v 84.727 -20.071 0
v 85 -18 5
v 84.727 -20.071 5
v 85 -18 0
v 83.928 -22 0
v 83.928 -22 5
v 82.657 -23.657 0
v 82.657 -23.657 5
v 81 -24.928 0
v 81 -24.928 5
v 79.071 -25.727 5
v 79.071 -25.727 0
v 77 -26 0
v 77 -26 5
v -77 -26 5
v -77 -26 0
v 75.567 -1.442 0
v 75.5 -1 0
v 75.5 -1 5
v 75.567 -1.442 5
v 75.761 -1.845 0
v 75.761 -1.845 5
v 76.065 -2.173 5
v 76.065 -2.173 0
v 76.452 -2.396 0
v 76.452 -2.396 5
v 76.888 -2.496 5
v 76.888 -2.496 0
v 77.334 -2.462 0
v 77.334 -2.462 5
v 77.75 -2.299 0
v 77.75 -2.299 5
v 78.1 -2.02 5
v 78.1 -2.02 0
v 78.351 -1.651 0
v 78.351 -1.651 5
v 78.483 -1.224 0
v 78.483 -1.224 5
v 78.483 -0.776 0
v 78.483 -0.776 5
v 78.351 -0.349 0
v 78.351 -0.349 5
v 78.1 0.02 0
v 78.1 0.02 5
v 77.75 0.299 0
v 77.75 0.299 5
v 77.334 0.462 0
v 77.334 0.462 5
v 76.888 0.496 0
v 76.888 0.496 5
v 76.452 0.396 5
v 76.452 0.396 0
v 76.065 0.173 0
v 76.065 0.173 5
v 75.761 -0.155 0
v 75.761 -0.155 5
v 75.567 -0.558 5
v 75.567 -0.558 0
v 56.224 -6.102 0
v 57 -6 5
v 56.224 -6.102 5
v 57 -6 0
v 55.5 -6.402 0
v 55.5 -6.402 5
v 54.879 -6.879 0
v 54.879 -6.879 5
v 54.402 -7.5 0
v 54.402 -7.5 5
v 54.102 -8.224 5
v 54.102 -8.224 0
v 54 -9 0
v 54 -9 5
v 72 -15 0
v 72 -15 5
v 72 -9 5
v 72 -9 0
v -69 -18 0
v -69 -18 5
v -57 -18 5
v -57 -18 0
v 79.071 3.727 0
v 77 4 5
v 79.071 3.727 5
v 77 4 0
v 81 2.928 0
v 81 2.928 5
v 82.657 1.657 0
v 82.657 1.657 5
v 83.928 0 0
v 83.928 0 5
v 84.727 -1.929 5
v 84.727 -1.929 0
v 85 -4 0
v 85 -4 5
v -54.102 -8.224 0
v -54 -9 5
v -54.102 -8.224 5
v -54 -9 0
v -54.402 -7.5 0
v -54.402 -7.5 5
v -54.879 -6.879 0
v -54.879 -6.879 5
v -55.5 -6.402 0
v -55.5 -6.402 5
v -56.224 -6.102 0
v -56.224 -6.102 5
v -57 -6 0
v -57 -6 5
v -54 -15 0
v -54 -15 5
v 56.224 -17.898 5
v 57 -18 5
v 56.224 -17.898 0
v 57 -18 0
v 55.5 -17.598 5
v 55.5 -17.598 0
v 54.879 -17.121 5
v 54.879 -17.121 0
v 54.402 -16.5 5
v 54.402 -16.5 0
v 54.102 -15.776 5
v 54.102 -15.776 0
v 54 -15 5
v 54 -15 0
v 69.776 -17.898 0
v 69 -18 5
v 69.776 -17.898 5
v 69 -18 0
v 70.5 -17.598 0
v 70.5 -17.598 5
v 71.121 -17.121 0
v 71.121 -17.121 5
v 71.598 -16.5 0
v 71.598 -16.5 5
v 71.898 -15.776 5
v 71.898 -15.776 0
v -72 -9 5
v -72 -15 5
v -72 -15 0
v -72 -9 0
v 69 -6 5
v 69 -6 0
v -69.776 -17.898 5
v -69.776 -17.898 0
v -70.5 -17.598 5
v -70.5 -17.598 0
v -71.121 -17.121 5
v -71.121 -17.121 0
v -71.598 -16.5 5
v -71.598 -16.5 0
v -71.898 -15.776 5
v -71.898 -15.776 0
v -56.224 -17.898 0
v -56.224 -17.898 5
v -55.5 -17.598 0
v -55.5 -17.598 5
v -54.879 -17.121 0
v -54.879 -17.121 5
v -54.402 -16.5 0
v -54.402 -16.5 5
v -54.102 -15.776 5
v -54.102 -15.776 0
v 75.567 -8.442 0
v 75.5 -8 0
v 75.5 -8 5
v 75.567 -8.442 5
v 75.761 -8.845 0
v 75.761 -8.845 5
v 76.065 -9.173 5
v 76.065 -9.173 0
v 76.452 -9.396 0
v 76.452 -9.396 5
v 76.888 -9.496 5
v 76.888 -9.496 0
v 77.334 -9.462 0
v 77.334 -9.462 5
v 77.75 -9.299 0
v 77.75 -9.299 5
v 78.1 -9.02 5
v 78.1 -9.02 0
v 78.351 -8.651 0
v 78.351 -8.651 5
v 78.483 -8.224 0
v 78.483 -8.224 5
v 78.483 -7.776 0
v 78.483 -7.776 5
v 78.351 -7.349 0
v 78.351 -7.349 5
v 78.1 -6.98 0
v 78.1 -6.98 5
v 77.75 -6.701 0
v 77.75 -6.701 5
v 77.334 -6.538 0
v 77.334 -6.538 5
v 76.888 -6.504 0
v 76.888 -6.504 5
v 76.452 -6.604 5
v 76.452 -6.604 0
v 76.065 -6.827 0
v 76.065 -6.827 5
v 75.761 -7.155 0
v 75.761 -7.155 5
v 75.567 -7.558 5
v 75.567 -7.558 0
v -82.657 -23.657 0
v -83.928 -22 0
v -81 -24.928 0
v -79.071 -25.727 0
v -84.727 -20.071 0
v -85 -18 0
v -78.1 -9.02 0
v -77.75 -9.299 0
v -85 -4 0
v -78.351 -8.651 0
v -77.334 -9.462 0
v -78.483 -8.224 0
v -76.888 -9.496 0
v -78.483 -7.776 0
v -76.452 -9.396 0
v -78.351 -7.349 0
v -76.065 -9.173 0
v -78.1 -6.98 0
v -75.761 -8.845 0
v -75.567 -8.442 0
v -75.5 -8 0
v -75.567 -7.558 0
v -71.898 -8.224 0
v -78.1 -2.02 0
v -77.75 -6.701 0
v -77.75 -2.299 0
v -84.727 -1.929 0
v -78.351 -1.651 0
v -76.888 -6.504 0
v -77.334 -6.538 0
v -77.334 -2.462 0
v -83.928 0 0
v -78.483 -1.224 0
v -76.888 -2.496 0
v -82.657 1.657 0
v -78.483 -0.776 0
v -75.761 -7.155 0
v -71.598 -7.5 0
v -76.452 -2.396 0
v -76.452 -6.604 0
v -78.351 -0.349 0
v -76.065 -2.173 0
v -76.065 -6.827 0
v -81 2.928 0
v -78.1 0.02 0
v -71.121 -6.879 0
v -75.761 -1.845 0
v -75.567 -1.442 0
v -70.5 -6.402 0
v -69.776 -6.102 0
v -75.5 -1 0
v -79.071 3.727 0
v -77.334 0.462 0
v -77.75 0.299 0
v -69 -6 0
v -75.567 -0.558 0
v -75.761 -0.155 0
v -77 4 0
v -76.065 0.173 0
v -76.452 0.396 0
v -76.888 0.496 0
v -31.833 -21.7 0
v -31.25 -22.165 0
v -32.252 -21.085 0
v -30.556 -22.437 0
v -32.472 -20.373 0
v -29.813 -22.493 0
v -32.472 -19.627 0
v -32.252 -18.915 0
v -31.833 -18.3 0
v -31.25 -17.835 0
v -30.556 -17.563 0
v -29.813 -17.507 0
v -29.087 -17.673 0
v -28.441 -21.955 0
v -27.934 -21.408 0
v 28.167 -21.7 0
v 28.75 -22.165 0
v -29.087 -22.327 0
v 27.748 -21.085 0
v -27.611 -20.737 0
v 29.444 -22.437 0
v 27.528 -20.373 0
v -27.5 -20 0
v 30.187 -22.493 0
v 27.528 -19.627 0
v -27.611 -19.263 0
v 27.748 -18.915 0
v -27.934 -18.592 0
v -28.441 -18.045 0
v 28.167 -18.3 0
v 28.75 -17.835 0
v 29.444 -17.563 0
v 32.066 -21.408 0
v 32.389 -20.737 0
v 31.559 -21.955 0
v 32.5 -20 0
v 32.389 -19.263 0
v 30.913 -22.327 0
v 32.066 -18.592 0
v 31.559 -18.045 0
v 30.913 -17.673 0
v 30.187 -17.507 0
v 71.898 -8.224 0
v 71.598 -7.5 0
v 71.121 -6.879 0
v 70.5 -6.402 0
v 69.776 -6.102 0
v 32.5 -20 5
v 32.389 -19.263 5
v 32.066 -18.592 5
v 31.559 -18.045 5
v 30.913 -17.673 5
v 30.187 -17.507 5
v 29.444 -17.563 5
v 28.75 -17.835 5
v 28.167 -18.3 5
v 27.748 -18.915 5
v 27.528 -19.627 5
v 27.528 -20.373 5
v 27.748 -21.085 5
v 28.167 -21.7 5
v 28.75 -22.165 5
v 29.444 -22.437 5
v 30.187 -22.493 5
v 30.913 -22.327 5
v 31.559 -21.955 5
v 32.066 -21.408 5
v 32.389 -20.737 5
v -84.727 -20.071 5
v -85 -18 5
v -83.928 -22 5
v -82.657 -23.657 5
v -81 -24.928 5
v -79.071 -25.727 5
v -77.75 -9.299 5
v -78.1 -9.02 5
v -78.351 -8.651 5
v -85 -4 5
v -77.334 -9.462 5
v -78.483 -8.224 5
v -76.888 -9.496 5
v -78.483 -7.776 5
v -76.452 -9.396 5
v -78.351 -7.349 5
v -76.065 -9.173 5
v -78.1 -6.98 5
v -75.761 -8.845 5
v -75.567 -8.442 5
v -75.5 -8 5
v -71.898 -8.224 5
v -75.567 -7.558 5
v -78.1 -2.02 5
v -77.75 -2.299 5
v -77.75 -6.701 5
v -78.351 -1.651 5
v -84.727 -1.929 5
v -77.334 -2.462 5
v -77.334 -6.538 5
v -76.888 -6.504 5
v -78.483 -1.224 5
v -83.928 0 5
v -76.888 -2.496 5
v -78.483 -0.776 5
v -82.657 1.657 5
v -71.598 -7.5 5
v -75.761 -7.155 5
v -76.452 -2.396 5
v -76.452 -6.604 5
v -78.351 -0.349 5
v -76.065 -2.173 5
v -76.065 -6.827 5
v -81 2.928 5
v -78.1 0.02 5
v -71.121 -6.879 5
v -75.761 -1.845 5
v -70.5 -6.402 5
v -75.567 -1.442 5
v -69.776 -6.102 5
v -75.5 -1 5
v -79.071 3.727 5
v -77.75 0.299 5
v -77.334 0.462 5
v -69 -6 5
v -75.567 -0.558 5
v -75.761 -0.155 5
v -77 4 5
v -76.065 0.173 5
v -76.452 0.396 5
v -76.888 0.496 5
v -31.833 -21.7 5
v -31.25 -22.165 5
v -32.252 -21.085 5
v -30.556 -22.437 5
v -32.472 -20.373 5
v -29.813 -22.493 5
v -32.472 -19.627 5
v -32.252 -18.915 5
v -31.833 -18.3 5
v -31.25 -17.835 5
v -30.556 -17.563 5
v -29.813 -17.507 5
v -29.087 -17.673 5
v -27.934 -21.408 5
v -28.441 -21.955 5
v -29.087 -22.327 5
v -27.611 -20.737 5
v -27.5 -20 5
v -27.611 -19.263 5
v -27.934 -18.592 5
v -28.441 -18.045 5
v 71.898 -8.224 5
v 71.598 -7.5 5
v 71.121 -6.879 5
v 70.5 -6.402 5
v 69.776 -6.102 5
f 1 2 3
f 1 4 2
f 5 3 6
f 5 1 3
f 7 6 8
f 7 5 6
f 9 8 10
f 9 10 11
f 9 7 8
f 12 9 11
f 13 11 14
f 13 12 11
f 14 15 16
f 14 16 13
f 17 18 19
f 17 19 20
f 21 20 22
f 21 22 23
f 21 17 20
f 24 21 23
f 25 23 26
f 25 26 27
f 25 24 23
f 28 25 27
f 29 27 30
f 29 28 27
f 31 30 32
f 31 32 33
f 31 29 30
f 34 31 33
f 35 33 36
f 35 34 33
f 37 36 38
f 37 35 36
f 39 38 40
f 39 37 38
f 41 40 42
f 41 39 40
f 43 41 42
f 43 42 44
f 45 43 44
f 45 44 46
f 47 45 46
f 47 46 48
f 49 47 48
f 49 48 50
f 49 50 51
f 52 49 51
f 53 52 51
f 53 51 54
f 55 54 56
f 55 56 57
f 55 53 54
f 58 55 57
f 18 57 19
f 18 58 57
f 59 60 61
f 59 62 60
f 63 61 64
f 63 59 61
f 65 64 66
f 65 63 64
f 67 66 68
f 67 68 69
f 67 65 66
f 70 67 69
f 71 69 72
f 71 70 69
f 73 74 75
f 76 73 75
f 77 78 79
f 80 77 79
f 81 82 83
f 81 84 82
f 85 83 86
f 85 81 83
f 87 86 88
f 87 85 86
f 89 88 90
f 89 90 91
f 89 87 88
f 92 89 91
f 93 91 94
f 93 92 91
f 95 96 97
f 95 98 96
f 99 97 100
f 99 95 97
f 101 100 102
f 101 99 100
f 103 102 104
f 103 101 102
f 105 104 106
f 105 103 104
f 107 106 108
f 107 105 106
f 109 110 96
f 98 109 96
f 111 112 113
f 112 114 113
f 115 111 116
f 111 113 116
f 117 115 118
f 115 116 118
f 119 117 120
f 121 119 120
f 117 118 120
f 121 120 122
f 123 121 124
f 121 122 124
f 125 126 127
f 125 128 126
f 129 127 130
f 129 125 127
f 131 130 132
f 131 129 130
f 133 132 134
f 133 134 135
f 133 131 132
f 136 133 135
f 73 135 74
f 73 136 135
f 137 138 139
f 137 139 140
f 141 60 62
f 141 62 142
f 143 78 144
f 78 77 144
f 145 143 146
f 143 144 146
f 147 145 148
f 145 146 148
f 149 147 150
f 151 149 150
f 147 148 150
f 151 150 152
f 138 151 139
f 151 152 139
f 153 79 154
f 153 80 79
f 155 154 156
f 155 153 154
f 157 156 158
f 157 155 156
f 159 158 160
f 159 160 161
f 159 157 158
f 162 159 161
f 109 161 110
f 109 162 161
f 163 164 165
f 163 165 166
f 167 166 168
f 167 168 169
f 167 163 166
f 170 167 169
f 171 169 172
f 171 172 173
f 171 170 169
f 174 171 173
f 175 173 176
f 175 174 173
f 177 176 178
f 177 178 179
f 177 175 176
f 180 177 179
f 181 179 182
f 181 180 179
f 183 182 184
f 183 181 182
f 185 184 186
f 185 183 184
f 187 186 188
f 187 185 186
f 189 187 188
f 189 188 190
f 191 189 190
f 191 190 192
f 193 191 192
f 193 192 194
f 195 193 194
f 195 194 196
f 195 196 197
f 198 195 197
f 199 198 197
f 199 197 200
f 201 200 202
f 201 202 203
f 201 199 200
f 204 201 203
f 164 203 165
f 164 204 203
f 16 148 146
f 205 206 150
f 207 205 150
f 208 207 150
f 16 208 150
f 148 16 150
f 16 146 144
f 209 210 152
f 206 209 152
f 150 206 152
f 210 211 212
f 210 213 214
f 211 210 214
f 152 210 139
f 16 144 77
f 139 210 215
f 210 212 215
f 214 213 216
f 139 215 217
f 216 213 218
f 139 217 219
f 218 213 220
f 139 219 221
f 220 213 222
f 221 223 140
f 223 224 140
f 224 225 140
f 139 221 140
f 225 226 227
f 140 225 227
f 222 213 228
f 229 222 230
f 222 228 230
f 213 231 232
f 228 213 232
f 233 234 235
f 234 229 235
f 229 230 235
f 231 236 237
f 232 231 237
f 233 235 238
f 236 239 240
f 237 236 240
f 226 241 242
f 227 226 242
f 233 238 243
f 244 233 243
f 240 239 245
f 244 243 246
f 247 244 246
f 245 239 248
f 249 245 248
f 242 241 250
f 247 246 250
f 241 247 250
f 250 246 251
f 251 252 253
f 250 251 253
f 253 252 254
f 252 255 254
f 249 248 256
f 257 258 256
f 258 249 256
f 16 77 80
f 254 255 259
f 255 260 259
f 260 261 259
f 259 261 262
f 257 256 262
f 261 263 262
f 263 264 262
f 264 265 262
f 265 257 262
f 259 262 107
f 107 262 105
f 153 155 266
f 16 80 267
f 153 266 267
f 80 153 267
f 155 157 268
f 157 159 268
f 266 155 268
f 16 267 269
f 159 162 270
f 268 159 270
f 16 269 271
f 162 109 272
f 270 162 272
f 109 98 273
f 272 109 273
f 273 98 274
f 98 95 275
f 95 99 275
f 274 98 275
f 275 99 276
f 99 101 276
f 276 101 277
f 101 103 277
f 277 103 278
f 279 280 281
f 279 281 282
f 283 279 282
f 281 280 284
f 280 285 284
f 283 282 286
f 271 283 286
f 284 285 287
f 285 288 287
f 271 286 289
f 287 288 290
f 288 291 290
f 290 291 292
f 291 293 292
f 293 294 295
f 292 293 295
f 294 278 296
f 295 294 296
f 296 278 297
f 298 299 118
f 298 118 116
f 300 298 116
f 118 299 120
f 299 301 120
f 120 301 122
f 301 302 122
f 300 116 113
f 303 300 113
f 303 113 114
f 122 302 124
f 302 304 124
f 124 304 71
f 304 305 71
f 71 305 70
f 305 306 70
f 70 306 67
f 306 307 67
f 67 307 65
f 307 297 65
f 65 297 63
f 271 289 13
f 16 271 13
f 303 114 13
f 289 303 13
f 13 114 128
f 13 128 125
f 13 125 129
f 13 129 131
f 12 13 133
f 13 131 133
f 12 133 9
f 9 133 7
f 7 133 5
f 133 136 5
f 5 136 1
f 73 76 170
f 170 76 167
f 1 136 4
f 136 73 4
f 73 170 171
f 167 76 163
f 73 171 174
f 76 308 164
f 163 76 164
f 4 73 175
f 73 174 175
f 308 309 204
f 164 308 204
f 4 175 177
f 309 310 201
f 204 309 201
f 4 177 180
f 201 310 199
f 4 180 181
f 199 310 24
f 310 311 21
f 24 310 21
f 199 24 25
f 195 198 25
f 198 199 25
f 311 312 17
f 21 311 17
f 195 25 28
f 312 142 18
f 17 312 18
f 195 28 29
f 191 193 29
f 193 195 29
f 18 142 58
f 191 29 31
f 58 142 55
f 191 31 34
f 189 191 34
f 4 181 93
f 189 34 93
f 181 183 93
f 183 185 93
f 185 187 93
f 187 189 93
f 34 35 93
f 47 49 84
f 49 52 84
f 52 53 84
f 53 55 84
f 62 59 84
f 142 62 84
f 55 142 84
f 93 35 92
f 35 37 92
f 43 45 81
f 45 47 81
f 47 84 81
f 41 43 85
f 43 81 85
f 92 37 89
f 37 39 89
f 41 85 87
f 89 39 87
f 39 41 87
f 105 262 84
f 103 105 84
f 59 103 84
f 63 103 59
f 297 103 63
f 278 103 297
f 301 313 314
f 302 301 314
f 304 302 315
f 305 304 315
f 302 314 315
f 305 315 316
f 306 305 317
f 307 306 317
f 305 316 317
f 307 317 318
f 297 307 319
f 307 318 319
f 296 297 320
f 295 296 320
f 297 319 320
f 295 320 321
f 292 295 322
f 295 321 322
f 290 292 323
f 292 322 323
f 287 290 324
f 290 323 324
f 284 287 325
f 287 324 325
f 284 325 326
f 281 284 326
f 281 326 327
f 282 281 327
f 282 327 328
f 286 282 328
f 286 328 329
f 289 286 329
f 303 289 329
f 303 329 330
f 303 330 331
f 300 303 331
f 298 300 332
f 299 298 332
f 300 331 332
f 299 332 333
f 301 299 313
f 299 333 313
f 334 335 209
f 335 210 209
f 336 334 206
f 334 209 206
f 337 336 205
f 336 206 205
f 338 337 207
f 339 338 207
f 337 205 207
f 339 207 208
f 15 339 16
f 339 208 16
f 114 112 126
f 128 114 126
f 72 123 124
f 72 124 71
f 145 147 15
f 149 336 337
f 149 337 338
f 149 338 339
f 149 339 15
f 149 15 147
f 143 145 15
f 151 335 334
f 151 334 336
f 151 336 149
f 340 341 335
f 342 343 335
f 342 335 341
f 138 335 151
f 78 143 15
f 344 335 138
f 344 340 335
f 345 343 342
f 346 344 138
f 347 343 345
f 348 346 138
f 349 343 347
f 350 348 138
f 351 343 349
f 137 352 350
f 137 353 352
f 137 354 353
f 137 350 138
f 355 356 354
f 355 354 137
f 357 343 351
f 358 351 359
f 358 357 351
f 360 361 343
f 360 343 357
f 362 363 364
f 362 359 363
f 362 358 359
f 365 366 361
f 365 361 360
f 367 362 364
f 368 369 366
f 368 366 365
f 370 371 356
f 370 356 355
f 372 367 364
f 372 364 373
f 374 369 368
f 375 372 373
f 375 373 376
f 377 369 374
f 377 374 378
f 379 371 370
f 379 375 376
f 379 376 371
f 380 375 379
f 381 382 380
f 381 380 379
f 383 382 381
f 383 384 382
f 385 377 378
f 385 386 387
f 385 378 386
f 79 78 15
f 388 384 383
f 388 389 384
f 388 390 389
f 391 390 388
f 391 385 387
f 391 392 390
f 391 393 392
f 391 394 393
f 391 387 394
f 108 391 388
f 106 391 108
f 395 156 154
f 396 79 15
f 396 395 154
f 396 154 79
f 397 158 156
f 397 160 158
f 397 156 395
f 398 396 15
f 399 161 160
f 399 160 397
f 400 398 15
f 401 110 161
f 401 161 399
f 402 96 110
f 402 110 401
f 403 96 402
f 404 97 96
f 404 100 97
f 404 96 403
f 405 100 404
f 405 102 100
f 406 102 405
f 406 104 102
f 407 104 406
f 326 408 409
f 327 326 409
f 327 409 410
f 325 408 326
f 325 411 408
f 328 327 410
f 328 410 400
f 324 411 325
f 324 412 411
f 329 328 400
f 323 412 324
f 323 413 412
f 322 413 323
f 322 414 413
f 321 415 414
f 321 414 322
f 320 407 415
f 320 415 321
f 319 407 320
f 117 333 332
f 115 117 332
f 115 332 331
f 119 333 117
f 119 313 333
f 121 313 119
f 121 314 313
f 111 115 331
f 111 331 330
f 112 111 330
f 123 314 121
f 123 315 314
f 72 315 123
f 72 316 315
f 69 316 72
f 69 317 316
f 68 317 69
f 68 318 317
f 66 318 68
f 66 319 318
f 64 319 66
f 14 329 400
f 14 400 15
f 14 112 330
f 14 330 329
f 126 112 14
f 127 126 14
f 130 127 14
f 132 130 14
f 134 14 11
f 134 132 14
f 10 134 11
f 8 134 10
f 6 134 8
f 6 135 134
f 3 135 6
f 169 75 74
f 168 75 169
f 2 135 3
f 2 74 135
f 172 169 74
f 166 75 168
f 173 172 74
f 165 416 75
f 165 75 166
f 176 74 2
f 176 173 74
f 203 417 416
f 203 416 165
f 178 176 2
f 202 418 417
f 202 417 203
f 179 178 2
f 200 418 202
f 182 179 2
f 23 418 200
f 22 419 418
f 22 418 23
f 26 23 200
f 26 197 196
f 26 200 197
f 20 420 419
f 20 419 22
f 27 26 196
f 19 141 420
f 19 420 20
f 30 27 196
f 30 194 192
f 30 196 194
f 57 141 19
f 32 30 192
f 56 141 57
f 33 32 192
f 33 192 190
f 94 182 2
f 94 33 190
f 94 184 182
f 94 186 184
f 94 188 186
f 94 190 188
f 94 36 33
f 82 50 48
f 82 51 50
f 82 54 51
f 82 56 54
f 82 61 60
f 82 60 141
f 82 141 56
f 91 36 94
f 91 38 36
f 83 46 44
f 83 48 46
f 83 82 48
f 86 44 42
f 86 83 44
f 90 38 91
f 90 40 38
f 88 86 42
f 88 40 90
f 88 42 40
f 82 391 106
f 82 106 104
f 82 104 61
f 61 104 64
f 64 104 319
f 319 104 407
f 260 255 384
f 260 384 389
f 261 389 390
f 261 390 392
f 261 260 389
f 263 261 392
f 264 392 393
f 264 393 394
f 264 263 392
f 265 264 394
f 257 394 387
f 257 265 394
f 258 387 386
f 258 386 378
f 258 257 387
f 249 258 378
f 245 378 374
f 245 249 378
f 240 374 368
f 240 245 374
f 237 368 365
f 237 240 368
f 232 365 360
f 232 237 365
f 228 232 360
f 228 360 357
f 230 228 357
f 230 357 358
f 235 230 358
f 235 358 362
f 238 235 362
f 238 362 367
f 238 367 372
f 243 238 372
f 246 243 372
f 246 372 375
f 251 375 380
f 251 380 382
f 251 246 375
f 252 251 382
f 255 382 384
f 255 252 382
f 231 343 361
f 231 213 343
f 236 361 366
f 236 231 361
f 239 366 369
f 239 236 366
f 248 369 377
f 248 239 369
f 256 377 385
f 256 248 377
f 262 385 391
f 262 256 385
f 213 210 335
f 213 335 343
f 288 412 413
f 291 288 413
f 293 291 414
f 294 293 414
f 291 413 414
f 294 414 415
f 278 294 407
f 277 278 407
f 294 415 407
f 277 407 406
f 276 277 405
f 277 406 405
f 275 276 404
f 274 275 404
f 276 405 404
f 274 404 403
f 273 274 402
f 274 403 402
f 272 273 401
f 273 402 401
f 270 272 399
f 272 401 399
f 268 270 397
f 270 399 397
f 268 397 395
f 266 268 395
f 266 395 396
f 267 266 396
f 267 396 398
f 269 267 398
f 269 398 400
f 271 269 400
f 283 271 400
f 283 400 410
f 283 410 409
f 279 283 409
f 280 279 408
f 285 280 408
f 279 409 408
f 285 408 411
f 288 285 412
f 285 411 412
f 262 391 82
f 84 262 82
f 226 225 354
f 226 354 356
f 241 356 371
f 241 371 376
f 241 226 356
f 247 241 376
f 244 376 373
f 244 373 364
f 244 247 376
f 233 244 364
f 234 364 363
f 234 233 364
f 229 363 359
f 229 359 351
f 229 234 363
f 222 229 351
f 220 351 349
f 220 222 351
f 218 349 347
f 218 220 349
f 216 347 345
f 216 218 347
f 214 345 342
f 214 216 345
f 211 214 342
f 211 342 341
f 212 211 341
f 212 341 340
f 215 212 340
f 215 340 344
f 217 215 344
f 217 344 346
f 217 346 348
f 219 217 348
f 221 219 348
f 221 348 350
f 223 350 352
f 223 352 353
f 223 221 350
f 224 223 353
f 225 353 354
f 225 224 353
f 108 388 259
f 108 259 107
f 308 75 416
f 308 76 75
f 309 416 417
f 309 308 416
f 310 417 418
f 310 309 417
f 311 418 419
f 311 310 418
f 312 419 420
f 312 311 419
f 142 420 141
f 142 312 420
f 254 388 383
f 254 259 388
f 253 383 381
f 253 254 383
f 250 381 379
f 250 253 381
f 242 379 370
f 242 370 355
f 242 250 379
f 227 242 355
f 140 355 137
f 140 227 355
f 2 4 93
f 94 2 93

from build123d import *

# Parameters (mm, degrees)
SKETCH_1_W          = 170
SKETCH_1_H          = 60
SKETCH_1_R          = 1.5
EXTRUDE_1_DEPTH     = 5
SKETCH_2_R          = 2.5
CUT_EXTRUDE_1_DEPTH = 5
SKETCH_3_W          = 170
SKETCH_3_H          = 26
CUT_EXTRUDE_2_DEPTH = 10
SKETCH_4_W          = 18
SKETCH_4_H          = 12
CUT_EXTRUDE_3_DEPTH = 10
FILLET_1_R          = 3
SKETCH_5_W          = 170
SKETCH_5_H          = 4
CUT_EXTRUDE_4_DEPTH = 91.277350426
FILLET_2_R          = 8


with BuildPart() as part:
    # 草图1 → 凸台-拉伸1 (new body)
    with BuildSketch(Plane.XY):
        Rectangle(SKETCH_1_W, SKETCH_1_H)
        with Locations((-77, -8)):
            Circle(SKETCH_1_R, mode=Mode.SUBTRACT)
        with Locations((-77, -1)):
            Circle(SKETCH_1_R, mode=Mode.SUBTRACT)
        with Locations(Location((77, -1, 0), (0, 0, 180))):
            Circle(SKETCH_1_R, mode=Mode.SUBTRACT)
        with Locations(Location((77, -8, 0), (0, 0, 180))):
            Circle(SKETCH_1_R, mode=Mode.SUBTRACT)
    extrude(amount=EXTRUDE_1_DEPTH)

    # 草图2 → 切除-拉伸1 (cut)
    with BuildSketch(Plane.XY.offset(5)):
        with Locations((-30, -20)):
            Circle(SKETCH_2_R)
        with Locations((30, -20)):
            Circle(SKETCH_2_R)
    extrude(amount=-CUT_EXTRUDE_1_DEPTH, mode=Mode.SUBTRACT)

    # 草图3 → 切除-拉伸2 (cut)
    with BuildSketch(Plane.XY.offset(5)):
        with Locations((0, 17)):
            Rectangle(SKETCH_3_W, SKETCH_3_H)
    extrude(amount=-CUT_EXTRUDE_2_DEPTH, mode=Mode.SUBTRACT)

    # 草图4 → 切除-拉伸3 (cut)
    with BuildSketch(Plane.XY.offset(5)):
        with Locations((-63, -12)):
            Rectangle(SKETCH_4_W, SKETCH_4_H)
        with Locations((63, -12)):
            Rectangle(SKETCH_4_W, SKETCH_4_H)
    extrude(amount=-CUT_EXTRUDE_3_DEPTH, mode=Mode.SUBTRACT)

    # 圆角1
    fillet_1_edges = [part.edges().sort_by_distance(p)[0] for p in [
        (-72, -18, 2.5),
        (-72, -6, 2.5),
        (-54, -6, 2.5),
        (-54, -18, 2.5),
        (72, -6, 2.5),
        (72, -18, 2.5),
        (54, -18, 2.5),
        (54, -6, 2.5),
    ]]
    fillet(fillet_1_edges, radius=FILLET_1_R)

    # 草图5 → 切除-拉伸4 (cut, through all)
    with BuildSketch(Plane.XY.offset(5)):
        with Locations((0, -28)):
            Rectangle(SKETCH_5_W, SKETCH_5_H)
    extrude(amount=-CUT_EXTRUDE_4_DEPTH, mode=Mode.SUBTRACT)

    # 圆角2
    fillet_2_edges = [part.edges().sort_by_distance(p)[0] for p in [
        (-85, -26, 2.5),
        (85, -26, 2.5),
        (-85, 4, 2.5),
        (85, 4, 2.5),
    ]]
    fillet(fillet_2_edges, radius=FILLET_2_R)


solid = part.part
